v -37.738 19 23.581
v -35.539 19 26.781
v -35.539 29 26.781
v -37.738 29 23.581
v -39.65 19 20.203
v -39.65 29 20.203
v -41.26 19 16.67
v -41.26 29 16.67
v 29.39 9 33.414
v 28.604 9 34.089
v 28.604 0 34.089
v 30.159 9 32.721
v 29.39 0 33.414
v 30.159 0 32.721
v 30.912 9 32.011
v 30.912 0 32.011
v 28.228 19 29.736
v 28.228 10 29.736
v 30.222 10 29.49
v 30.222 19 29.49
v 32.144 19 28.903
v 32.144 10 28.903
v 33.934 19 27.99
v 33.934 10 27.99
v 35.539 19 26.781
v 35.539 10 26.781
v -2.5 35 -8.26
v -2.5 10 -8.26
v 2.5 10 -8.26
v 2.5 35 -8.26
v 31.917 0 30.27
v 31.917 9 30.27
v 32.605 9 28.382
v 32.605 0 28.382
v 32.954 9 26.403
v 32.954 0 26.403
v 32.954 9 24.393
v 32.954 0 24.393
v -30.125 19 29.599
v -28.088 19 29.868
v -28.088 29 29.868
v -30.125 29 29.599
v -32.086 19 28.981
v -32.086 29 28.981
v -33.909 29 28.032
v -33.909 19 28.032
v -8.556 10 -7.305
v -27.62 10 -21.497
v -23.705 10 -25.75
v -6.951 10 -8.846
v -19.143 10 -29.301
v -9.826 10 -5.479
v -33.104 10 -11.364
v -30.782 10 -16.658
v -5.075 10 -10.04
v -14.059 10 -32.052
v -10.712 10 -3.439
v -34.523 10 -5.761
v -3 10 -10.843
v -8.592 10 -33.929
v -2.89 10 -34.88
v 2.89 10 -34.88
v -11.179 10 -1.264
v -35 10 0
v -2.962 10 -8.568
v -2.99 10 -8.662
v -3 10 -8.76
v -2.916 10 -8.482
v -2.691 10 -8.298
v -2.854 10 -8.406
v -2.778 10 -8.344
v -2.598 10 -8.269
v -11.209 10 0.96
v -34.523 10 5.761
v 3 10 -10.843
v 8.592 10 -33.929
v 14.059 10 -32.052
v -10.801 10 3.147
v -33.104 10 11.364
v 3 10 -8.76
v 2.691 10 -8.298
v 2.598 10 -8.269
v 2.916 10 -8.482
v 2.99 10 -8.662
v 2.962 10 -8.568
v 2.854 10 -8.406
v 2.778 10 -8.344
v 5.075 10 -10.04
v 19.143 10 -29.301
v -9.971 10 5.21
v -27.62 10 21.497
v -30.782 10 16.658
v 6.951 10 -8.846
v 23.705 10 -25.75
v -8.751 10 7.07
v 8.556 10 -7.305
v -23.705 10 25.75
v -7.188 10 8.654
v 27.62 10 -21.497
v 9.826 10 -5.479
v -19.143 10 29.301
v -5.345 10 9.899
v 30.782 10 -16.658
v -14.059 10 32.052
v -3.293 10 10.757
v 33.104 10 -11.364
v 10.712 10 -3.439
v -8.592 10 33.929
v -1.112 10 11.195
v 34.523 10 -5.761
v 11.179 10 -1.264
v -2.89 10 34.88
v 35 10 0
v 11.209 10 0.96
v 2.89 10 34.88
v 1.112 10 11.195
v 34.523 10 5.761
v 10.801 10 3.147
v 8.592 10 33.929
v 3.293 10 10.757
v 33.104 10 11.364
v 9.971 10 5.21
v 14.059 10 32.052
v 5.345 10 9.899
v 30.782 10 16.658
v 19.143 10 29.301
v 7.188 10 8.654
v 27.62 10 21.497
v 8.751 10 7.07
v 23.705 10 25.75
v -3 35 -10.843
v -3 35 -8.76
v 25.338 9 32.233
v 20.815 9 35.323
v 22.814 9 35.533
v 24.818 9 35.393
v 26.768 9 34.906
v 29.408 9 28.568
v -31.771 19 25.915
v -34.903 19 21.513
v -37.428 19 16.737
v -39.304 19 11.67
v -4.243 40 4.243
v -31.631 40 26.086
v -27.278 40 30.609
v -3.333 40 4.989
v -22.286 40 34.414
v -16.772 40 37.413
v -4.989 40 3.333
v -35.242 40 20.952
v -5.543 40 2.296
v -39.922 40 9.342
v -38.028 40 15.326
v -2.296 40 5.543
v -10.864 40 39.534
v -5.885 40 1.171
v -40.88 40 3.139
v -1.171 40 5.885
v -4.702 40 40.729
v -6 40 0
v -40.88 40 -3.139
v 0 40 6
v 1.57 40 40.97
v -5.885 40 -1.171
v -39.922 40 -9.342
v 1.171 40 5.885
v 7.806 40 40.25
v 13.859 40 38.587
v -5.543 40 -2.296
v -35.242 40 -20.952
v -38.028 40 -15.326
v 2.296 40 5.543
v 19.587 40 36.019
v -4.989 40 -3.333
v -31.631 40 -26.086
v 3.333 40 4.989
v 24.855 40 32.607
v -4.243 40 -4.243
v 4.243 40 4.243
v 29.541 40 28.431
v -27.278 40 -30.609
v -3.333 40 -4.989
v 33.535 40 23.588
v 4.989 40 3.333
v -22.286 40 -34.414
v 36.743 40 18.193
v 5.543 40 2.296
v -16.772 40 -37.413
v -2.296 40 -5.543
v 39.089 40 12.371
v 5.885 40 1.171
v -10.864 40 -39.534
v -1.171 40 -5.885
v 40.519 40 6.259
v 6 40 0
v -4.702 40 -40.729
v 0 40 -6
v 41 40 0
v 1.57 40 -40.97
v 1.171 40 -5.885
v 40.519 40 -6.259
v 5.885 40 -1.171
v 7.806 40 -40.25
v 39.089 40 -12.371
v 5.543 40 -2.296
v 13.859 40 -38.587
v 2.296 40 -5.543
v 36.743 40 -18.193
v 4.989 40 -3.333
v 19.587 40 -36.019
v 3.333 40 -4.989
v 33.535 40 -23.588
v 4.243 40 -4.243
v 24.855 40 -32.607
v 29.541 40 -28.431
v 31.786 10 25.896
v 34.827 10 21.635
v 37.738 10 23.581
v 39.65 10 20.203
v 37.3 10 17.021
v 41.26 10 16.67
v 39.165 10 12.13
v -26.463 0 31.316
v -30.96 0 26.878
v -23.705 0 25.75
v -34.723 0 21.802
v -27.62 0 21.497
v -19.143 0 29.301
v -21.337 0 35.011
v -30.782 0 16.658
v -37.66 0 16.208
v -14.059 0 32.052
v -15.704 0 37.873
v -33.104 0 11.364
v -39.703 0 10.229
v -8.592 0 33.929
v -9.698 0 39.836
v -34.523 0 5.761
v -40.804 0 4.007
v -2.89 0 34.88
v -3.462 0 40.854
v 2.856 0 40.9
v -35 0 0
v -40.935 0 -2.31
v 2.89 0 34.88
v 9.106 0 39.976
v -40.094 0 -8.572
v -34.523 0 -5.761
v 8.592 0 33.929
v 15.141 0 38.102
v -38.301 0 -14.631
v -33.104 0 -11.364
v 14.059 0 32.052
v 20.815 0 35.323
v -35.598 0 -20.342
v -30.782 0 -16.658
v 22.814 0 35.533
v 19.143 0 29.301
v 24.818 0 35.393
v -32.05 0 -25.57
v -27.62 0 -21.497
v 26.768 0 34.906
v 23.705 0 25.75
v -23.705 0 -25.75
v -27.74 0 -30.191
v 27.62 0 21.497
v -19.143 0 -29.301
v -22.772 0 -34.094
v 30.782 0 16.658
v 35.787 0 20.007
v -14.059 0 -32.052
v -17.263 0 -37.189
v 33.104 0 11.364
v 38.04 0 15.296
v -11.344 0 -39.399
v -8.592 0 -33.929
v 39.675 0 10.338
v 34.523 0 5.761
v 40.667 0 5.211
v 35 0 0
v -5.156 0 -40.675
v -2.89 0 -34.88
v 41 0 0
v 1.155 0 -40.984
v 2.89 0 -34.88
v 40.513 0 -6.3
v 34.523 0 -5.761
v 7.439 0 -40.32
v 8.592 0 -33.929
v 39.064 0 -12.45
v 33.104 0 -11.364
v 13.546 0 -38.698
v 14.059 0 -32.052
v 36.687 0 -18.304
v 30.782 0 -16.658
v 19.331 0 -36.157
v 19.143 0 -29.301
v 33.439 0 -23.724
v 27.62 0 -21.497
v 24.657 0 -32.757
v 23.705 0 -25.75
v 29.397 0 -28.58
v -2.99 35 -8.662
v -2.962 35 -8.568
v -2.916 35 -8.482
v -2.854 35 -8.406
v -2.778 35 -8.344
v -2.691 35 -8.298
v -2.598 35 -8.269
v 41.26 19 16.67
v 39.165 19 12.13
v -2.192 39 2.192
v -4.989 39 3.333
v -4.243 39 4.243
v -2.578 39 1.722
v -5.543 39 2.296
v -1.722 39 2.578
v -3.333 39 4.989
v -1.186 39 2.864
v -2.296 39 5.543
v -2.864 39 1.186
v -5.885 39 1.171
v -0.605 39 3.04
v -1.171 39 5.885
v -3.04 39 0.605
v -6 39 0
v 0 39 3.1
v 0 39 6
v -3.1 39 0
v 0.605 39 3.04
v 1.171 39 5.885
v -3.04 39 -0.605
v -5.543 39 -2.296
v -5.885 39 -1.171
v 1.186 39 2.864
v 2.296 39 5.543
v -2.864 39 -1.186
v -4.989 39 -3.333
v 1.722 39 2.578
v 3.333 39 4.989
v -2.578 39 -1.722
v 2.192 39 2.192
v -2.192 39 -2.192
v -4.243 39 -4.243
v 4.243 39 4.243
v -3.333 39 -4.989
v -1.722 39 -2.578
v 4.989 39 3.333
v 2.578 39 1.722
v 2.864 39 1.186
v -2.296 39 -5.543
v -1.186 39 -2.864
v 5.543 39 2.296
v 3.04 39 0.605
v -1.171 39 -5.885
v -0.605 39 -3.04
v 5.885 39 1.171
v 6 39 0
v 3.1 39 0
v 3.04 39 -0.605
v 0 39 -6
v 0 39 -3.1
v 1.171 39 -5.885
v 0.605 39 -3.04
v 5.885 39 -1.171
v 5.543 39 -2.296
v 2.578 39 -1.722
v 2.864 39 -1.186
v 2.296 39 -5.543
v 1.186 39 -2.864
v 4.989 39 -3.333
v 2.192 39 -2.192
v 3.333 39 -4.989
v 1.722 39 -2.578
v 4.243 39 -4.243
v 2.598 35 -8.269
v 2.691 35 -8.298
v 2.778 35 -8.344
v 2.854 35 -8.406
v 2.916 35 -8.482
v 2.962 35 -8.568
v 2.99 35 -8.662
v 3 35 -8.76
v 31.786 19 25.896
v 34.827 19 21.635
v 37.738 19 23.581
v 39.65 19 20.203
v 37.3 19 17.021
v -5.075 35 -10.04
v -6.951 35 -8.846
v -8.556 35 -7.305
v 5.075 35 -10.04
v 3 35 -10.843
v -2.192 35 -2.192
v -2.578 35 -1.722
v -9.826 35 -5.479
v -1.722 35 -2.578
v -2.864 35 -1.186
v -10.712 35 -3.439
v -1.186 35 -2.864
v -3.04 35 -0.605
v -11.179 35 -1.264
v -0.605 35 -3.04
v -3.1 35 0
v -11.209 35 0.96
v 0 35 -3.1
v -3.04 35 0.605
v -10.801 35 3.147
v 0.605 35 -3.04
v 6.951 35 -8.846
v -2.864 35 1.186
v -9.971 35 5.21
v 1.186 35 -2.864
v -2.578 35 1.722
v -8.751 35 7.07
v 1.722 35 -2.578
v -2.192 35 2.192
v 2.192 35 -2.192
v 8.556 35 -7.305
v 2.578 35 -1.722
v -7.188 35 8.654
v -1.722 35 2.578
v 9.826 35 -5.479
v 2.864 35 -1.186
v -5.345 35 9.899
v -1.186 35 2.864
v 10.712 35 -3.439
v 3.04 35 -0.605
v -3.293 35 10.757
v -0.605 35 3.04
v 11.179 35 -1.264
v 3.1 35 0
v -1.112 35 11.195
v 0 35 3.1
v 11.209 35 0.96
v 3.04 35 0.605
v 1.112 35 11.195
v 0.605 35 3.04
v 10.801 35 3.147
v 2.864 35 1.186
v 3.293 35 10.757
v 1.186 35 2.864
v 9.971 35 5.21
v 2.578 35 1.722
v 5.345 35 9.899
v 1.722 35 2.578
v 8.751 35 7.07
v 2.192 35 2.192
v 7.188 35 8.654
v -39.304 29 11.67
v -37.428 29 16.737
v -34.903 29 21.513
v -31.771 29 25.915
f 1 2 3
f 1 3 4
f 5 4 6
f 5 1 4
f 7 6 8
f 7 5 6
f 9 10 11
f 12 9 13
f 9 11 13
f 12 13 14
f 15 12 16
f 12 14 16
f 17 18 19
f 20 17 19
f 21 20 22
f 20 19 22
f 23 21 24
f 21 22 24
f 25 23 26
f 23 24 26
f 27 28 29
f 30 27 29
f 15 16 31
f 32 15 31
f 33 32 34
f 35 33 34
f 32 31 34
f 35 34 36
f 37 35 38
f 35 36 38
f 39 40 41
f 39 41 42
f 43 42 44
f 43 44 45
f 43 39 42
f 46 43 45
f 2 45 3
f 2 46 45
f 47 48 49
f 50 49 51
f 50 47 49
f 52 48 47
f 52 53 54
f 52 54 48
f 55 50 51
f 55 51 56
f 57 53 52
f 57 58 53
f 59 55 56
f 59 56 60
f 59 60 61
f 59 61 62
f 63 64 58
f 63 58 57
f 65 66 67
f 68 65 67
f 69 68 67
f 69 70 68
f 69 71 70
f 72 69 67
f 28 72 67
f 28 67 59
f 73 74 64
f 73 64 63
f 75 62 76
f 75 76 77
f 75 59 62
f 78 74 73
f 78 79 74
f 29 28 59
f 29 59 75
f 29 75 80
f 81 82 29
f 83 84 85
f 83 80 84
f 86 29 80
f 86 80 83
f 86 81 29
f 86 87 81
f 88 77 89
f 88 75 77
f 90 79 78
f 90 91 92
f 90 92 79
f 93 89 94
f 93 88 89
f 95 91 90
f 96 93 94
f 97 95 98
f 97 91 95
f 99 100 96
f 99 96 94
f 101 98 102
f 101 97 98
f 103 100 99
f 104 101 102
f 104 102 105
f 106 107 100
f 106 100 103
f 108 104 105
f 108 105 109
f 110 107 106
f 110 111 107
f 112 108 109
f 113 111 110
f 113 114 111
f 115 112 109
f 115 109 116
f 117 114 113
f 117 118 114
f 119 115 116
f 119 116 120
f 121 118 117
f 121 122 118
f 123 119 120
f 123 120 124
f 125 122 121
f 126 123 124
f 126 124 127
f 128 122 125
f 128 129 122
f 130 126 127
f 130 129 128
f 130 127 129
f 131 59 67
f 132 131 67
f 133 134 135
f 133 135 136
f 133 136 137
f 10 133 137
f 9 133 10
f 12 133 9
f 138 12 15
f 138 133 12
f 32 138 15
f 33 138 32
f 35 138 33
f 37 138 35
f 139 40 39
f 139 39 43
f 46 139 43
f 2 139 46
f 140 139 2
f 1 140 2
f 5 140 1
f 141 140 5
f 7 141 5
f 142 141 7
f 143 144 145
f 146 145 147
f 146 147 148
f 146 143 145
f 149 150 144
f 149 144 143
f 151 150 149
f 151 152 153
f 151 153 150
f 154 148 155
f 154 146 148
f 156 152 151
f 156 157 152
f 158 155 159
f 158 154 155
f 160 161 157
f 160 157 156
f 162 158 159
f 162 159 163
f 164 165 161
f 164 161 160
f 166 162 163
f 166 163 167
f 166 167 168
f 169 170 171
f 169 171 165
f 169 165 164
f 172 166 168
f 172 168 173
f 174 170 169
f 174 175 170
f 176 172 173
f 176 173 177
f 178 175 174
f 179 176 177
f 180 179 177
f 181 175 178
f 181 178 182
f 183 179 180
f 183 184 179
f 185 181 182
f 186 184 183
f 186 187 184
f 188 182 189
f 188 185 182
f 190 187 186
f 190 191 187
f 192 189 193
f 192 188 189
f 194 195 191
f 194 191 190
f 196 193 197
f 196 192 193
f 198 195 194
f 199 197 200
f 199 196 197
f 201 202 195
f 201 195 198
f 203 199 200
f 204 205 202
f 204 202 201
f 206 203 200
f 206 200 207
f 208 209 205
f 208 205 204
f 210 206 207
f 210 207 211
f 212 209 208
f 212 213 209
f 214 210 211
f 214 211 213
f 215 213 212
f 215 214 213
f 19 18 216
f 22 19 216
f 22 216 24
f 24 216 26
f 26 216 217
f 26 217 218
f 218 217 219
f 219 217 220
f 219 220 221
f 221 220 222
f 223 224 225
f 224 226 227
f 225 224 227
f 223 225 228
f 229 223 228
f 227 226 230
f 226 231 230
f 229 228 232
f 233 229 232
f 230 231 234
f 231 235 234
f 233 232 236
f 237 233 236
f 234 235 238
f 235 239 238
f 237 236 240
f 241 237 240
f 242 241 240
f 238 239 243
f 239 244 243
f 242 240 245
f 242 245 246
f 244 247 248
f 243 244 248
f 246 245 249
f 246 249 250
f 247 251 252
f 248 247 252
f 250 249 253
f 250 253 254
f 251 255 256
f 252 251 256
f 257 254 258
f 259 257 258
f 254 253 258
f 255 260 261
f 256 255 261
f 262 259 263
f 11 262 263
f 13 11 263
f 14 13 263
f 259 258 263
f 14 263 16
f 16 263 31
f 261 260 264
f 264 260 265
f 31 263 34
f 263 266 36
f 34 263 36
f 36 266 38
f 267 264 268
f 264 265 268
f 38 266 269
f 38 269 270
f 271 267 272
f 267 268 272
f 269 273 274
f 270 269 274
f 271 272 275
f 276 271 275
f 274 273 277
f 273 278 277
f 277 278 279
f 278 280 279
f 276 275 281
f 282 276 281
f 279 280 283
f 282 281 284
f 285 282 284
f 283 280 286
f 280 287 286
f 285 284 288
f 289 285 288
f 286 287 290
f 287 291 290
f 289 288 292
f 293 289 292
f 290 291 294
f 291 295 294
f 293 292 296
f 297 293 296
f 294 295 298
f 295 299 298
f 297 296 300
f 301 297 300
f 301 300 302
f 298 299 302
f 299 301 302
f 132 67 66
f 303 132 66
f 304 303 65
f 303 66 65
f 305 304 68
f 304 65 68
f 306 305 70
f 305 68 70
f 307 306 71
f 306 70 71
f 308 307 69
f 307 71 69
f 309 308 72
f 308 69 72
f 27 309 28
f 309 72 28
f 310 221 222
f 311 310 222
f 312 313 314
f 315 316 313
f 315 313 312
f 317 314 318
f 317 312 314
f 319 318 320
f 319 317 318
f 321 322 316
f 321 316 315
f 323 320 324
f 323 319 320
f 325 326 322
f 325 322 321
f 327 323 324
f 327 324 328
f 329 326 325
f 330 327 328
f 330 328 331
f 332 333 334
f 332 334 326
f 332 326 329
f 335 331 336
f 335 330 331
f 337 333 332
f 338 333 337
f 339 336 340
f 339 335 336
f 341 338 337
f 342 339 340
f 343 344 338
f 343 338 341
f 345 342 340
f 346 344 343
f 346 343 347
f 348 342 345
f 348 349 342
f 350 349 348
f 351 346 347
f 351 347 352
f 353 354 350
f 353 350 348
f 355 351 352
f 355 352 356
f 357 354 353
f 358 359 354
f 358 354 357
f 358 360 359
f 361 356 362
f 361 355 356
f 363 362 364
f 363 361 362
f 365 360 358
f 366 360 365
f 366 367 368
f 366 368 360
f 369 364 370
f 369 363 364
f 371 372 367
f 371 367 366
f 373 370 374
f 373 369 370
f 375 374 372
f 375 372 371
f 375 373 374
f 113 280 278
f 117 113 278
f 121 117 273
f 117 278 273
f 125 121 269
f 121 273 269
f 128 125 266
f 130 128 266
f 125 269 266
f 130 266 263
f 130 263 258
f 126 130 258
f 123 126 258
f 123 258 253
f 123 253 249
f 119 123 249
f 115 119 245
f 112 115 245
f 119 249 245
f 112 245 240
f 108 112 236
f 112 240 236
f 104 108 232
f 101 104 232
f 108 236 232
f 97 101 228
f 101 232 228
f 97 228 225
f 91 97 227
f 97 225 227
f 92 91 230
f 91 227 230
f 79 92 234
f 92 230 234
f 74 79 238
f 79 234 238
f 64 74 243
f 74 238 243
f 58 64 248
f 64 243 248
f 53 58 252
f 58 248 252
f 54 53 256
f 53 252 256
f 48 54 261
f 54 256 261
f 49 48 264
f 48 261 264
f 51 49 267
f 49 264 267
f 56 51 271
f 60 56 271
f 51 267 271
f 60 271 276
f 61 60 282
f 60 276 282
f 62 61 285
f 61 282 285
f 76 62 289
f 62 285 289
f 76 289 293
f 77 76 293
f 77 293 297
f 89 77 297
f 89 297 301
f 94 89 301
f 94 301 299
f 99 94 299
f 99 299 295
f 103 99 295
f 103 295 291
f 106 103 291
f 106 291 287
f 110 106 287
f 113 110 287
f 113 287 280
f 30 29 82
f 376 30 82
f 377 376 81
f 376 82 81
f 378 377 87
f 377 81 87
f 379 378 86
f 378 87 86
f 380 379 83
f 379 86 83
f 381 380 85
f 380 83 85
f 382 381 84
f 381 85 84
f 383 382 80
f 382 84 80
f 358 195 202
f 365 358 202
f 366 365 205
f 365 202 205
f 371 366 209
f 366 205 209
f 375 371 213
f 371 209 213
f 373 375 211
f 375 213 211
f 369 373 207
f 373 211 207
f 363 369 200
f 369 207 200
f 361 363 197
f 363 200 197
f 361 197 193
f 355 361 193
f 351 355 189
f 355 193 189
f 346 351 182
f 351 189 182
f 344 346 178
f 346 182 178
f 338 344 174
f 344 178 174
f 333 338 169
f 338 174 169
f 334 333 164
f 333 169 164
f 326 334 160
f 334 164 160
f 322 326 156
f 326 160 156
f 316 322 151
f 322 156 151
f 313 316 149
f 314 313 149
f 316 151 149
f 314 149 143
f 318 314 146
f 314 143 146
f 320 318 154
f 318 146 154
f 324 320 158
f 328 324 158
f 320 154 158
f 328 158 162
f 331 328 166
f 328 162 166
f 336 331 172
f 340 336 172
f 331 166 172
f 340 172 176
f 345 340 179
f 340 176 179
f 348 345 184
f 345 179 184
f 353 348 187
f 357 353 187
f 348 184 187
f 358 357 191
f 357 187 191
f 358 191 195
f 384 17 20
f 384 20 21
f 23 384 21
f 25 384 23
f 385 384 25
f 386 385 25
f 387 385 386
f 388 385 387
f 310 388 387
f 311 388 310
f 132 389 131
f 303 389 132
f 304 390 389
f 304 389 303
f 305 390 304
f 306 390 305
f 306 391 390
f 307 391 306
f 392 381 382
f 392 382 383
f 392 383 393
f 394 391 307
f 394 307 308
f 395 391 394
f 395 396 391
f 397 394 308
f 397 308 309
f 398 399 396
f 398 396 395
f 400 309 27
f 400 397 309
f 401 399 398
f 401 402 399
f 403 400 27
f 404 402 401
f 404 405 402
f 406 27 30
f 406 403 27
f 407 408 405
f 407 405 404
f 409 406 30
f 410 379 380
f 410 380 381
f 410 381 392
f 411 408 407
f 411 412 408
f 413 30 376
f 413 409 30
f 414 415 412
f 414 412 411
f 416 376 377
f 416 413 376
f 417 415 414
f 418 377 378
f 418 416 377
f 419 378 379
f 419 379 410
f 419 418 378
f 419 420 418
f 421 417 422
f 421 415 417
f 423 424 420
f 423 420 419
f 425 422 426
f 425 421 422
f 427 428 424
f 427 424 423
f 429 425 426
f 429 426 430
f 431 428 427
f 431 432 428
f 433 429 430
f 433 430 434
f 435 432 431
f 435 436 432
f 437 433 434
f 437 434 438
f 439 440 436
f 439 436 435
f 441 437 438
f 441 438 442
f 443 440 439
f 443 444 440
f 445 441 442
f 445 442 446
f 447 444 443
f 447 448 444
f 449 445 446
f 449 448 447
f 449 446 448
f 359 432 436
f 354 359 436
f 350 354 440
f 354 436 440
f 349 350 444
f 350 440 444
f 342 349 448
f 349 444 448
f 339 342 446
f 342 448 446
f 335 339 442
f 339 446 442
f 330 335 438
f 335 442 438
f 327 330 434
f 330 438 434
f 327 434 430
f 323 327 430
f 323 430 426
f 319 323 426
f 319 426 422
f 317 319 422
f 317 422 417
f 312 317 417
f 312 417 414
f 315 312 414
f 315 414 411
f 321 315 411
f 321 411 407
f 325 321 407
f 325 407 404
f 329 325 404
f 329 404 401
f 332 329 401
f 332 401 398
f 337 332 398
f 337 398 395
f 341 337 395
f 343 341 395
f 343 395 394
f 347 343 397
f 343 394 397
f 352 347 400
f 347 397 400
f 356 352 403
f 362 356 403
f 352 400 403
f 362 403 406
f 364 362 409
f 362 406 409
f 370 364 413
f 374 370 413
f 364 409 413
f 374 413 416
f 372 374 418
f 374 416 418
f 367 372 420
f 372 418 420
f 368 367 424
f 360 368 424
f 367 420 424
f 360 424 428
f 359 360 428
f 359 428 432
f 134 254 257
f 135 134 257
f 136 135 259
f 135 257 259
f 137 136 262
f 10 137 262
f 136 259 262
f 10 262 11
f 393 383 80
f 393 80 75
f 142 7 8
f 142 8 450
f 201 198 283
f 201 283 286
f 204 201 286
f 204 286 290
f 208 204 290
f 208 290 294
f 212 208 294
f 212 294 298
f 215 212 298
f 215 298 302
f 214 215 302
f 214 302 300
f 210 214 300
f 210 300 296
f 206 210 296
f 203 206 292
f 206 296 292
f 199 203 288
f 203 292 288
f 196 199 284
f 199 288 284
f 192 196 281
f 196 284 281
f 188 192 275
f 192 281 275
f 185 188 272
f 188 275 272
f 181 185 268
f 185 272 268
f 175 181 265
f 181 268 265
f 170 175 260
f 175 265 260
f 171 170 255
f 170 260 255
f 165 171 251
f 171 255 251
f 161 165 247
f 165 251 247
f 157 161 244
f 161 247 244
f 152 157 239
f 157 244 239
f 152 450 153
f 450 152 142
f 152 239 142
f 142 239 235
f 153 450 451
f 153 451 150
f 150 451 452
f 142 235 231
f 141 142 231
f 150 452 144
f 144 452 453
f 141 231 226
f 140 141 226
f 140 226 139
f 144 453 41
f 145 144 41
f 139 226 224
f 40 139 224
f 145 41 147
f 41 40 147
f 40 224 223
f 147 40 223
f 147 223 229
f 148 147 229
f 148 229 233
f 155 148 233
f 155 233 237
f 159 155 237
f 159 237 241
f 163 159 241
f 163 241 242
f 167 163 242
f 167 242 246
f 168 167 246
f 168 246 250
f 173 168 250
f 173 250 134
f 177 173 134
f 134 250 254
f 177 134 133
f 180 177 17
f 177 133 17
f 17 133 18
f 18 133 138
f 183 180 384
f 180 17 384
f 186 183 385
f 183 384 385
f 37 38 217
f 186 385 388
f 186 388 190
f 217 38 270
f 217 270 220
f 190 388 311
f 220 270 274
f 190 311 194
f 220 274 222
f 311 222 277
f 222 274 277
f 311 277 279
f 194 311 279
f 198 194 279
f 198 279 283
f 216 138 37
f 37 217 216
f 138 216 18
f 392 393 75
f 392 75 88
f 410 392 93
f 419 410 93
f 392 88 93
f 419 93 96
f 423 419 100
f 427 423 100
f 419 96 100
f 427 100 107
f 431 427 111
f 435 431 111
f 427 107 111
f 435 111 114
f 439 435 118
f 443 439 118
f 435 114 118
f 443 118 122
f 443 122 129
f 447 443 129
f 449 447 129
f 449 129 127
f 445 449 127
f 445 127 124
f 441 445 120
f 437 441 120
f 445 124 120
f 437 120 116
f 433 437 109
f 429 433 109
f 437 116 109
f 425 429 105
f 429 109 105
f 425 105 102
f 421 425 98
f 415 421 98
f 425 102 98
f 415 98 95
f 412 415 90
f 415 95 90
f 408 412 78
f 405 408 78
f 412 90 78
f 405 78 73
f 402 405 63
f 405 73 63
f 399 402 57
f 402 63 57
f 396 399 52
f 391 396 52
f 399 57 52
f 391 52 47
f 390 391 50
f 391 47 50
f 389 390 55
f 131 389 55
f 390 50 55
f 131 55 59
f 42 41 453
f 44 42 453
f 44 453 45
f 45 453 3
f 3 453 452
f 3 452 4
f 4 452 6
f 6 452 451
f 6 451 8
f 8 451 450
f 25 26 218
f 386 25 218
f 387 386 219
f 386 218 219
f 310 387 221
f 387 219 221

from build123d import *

# Parameters (mm, degrees)
SKETCH2_R           = 41
BOSS_EXTRUDE1_DEPTH = 40
HOME_DEPTH          = 9
END_R_DEPTH         = 9
END_L_DEPTH         = 10
SKETCH8_R           = 35
CUT_EXTRUDE1_DEPTH  = 10
CUT_EXTRUDE3_DEPTH  = 25
CUT_EXTRUDE4_REACH  = 7
SKETCH11_R          = 3.1
SKETCH12_R          = 6
CUT_EXTRUDE5_DEPTH  = 1


with BuildPart() as part:
    # Sketch2 → Boss-Extrude1 (new body)
    with BuildSketch(Plane(origin=(0, 0, 0), x_dir=(1, 0, 0), z_dir=(0, 1, 0))):
        Circle(SKETCH2_R)
    extrude(amount=BOSS_EXTRUDE1_DEPTH)

    # Sketch3 → Home (add)
    with BuildSketch(Plane(origin=(0, 0, 0), x_dir=(1, 0, 0), z_dir=(0, 1, 0))):
        with BuildLine():
            ThreePointArc((28.604048631, -34.088977719), (29.776311983, -33.069944734), (30.912297485, -32.010621115))
            ThreePointArc((30.912297485, -32.010621115), (32.604689255, -28.381998607), (32.953955321, -24.393376738))
            ThreePointArc((32.953955321, -24.393376738), (27.434354861, -30.468937845), (20.815120959, -35.323232291))
            ThreePointArc((20.815120959, -35.323232291), (24.818400986, -35.392804054), (28.604048631, -34.088977719))
        make_face()
    extrude(amount=HOME_DEPTH)

    # Sketch4 → End R (add)
    with BuildSketch(Plane(origin=(0, 10, 0), x_dir=(1, 0, 0), z_dir=(0, 1, 0))):
        with BuildLine():
            Line((41.259681528, -16.669993407), (39.164522306, -12.130135718))
            ThreePointArc((39.164522306, -12.130135718), (34.826898772, -21.635321166), (28.227629104, -29.735516729))
            ThreePointArc((28.227629104, -29.735516729), (32.143955565, -28.90276331), (35.539280197, -26.78076853))
            ThreePointArc((35.539280197, -26.78076853), (38.730828469, -21.912848425), (41.259681528, -16.669993407))
        make_face()
    extrude(amount=END_R_DEPTH)

    # Sketch6 → End L (add)
    with BuildSketch(Plane(origin=(0, 19, 0), x_dir=(1, 0, 0), z_dir=(0, 1, 0))):
        with BuildLine():
            Line((-41.259681528, -16.669993407), (-39.304086987, -11.669993407))
            ThreePointArc((-39.304086987, -11.669993407), (-34.902749486, -21.512742231), (-28.087672455, -29.867752779))
            ThreePointArc((-28.087672455, -29.867752779), (-32.085635632, -28.981220402), (-35.539280197, -26.78076853))
            ThreePointArc((-35.539280197, -26.78076853), (-38.730828469, -21.912848425), (-41.259681528, -16.669993407))
        make_face()
    extrude(amount=END_L_DEPTH)

    # Sketch8 → Cut-Extrude1 (cut)
    with BuildSketch(Plane.XZ):
        Circle(SKETCH8_R)
    extrude(amount=-CUT_EXTRUDE1_DEPTH, mode=Mode.SUBTRACT)

    # Sketch10 → Cut-Extrude3 (cut)
    with BuildSketch(Plane.XZ.offset(-10)):
        with BuildLine():
            Line((-2.5, -8.259618977), (2.5, -8.259618977))
            ThreePointArc((2.5, -8.259618977), (2.853553391, -8.406065586), (3, -8.759618977))
            Line((3, -8.759618977), (3, -10.842624221))
            ThreePointArc((3, -10.842624221), (0, 11.25), (-3, -10.842624221))
            Line((-3, -10.842624221), (-3, -8.759618977))
            ThreePointArc((-3, -8.759618977), (-2.853553391, -8.406065586), (-2.5, -8.259618977))
        make_face()
    extrude(amount=-CUT_EXTRUDE3_DEPTH, mode=Mode.SUBTRACT)

    # Sketch11 → Cut-Extrude4 (cut, up to next)
    with BuildSketch(Plane.XZ.offset(-35), mode=Mode.PRIVATE) as cut_extrude4_sk1:
        Circle(SKETCH11_R)
    cut_extrude4_tool1 = extrude(cut_extrude4_sk1.sketch, amount=-CUT_EXTRUDE4_REACH, mode=Mode.PRIVATE) & part.part
    add(cut_extrude4_tool1.solids().sort_by_distance((0, 35, 0))[0], mode=Mode.SUBTRACT)

    # Sketch12 → Cut-Extrude5 (cut)
    with BuildSketch(Plane(origin=(0, 40, 0), x_dir=(1, 0, 0), z_dir=(0, 1, 0))):
        Circle(SKETCH12_R)
    extrude(amount=-CUT_EXTRUDE5_DEPTH, mode=Mode.SUBTRACT)


solid = part.part
